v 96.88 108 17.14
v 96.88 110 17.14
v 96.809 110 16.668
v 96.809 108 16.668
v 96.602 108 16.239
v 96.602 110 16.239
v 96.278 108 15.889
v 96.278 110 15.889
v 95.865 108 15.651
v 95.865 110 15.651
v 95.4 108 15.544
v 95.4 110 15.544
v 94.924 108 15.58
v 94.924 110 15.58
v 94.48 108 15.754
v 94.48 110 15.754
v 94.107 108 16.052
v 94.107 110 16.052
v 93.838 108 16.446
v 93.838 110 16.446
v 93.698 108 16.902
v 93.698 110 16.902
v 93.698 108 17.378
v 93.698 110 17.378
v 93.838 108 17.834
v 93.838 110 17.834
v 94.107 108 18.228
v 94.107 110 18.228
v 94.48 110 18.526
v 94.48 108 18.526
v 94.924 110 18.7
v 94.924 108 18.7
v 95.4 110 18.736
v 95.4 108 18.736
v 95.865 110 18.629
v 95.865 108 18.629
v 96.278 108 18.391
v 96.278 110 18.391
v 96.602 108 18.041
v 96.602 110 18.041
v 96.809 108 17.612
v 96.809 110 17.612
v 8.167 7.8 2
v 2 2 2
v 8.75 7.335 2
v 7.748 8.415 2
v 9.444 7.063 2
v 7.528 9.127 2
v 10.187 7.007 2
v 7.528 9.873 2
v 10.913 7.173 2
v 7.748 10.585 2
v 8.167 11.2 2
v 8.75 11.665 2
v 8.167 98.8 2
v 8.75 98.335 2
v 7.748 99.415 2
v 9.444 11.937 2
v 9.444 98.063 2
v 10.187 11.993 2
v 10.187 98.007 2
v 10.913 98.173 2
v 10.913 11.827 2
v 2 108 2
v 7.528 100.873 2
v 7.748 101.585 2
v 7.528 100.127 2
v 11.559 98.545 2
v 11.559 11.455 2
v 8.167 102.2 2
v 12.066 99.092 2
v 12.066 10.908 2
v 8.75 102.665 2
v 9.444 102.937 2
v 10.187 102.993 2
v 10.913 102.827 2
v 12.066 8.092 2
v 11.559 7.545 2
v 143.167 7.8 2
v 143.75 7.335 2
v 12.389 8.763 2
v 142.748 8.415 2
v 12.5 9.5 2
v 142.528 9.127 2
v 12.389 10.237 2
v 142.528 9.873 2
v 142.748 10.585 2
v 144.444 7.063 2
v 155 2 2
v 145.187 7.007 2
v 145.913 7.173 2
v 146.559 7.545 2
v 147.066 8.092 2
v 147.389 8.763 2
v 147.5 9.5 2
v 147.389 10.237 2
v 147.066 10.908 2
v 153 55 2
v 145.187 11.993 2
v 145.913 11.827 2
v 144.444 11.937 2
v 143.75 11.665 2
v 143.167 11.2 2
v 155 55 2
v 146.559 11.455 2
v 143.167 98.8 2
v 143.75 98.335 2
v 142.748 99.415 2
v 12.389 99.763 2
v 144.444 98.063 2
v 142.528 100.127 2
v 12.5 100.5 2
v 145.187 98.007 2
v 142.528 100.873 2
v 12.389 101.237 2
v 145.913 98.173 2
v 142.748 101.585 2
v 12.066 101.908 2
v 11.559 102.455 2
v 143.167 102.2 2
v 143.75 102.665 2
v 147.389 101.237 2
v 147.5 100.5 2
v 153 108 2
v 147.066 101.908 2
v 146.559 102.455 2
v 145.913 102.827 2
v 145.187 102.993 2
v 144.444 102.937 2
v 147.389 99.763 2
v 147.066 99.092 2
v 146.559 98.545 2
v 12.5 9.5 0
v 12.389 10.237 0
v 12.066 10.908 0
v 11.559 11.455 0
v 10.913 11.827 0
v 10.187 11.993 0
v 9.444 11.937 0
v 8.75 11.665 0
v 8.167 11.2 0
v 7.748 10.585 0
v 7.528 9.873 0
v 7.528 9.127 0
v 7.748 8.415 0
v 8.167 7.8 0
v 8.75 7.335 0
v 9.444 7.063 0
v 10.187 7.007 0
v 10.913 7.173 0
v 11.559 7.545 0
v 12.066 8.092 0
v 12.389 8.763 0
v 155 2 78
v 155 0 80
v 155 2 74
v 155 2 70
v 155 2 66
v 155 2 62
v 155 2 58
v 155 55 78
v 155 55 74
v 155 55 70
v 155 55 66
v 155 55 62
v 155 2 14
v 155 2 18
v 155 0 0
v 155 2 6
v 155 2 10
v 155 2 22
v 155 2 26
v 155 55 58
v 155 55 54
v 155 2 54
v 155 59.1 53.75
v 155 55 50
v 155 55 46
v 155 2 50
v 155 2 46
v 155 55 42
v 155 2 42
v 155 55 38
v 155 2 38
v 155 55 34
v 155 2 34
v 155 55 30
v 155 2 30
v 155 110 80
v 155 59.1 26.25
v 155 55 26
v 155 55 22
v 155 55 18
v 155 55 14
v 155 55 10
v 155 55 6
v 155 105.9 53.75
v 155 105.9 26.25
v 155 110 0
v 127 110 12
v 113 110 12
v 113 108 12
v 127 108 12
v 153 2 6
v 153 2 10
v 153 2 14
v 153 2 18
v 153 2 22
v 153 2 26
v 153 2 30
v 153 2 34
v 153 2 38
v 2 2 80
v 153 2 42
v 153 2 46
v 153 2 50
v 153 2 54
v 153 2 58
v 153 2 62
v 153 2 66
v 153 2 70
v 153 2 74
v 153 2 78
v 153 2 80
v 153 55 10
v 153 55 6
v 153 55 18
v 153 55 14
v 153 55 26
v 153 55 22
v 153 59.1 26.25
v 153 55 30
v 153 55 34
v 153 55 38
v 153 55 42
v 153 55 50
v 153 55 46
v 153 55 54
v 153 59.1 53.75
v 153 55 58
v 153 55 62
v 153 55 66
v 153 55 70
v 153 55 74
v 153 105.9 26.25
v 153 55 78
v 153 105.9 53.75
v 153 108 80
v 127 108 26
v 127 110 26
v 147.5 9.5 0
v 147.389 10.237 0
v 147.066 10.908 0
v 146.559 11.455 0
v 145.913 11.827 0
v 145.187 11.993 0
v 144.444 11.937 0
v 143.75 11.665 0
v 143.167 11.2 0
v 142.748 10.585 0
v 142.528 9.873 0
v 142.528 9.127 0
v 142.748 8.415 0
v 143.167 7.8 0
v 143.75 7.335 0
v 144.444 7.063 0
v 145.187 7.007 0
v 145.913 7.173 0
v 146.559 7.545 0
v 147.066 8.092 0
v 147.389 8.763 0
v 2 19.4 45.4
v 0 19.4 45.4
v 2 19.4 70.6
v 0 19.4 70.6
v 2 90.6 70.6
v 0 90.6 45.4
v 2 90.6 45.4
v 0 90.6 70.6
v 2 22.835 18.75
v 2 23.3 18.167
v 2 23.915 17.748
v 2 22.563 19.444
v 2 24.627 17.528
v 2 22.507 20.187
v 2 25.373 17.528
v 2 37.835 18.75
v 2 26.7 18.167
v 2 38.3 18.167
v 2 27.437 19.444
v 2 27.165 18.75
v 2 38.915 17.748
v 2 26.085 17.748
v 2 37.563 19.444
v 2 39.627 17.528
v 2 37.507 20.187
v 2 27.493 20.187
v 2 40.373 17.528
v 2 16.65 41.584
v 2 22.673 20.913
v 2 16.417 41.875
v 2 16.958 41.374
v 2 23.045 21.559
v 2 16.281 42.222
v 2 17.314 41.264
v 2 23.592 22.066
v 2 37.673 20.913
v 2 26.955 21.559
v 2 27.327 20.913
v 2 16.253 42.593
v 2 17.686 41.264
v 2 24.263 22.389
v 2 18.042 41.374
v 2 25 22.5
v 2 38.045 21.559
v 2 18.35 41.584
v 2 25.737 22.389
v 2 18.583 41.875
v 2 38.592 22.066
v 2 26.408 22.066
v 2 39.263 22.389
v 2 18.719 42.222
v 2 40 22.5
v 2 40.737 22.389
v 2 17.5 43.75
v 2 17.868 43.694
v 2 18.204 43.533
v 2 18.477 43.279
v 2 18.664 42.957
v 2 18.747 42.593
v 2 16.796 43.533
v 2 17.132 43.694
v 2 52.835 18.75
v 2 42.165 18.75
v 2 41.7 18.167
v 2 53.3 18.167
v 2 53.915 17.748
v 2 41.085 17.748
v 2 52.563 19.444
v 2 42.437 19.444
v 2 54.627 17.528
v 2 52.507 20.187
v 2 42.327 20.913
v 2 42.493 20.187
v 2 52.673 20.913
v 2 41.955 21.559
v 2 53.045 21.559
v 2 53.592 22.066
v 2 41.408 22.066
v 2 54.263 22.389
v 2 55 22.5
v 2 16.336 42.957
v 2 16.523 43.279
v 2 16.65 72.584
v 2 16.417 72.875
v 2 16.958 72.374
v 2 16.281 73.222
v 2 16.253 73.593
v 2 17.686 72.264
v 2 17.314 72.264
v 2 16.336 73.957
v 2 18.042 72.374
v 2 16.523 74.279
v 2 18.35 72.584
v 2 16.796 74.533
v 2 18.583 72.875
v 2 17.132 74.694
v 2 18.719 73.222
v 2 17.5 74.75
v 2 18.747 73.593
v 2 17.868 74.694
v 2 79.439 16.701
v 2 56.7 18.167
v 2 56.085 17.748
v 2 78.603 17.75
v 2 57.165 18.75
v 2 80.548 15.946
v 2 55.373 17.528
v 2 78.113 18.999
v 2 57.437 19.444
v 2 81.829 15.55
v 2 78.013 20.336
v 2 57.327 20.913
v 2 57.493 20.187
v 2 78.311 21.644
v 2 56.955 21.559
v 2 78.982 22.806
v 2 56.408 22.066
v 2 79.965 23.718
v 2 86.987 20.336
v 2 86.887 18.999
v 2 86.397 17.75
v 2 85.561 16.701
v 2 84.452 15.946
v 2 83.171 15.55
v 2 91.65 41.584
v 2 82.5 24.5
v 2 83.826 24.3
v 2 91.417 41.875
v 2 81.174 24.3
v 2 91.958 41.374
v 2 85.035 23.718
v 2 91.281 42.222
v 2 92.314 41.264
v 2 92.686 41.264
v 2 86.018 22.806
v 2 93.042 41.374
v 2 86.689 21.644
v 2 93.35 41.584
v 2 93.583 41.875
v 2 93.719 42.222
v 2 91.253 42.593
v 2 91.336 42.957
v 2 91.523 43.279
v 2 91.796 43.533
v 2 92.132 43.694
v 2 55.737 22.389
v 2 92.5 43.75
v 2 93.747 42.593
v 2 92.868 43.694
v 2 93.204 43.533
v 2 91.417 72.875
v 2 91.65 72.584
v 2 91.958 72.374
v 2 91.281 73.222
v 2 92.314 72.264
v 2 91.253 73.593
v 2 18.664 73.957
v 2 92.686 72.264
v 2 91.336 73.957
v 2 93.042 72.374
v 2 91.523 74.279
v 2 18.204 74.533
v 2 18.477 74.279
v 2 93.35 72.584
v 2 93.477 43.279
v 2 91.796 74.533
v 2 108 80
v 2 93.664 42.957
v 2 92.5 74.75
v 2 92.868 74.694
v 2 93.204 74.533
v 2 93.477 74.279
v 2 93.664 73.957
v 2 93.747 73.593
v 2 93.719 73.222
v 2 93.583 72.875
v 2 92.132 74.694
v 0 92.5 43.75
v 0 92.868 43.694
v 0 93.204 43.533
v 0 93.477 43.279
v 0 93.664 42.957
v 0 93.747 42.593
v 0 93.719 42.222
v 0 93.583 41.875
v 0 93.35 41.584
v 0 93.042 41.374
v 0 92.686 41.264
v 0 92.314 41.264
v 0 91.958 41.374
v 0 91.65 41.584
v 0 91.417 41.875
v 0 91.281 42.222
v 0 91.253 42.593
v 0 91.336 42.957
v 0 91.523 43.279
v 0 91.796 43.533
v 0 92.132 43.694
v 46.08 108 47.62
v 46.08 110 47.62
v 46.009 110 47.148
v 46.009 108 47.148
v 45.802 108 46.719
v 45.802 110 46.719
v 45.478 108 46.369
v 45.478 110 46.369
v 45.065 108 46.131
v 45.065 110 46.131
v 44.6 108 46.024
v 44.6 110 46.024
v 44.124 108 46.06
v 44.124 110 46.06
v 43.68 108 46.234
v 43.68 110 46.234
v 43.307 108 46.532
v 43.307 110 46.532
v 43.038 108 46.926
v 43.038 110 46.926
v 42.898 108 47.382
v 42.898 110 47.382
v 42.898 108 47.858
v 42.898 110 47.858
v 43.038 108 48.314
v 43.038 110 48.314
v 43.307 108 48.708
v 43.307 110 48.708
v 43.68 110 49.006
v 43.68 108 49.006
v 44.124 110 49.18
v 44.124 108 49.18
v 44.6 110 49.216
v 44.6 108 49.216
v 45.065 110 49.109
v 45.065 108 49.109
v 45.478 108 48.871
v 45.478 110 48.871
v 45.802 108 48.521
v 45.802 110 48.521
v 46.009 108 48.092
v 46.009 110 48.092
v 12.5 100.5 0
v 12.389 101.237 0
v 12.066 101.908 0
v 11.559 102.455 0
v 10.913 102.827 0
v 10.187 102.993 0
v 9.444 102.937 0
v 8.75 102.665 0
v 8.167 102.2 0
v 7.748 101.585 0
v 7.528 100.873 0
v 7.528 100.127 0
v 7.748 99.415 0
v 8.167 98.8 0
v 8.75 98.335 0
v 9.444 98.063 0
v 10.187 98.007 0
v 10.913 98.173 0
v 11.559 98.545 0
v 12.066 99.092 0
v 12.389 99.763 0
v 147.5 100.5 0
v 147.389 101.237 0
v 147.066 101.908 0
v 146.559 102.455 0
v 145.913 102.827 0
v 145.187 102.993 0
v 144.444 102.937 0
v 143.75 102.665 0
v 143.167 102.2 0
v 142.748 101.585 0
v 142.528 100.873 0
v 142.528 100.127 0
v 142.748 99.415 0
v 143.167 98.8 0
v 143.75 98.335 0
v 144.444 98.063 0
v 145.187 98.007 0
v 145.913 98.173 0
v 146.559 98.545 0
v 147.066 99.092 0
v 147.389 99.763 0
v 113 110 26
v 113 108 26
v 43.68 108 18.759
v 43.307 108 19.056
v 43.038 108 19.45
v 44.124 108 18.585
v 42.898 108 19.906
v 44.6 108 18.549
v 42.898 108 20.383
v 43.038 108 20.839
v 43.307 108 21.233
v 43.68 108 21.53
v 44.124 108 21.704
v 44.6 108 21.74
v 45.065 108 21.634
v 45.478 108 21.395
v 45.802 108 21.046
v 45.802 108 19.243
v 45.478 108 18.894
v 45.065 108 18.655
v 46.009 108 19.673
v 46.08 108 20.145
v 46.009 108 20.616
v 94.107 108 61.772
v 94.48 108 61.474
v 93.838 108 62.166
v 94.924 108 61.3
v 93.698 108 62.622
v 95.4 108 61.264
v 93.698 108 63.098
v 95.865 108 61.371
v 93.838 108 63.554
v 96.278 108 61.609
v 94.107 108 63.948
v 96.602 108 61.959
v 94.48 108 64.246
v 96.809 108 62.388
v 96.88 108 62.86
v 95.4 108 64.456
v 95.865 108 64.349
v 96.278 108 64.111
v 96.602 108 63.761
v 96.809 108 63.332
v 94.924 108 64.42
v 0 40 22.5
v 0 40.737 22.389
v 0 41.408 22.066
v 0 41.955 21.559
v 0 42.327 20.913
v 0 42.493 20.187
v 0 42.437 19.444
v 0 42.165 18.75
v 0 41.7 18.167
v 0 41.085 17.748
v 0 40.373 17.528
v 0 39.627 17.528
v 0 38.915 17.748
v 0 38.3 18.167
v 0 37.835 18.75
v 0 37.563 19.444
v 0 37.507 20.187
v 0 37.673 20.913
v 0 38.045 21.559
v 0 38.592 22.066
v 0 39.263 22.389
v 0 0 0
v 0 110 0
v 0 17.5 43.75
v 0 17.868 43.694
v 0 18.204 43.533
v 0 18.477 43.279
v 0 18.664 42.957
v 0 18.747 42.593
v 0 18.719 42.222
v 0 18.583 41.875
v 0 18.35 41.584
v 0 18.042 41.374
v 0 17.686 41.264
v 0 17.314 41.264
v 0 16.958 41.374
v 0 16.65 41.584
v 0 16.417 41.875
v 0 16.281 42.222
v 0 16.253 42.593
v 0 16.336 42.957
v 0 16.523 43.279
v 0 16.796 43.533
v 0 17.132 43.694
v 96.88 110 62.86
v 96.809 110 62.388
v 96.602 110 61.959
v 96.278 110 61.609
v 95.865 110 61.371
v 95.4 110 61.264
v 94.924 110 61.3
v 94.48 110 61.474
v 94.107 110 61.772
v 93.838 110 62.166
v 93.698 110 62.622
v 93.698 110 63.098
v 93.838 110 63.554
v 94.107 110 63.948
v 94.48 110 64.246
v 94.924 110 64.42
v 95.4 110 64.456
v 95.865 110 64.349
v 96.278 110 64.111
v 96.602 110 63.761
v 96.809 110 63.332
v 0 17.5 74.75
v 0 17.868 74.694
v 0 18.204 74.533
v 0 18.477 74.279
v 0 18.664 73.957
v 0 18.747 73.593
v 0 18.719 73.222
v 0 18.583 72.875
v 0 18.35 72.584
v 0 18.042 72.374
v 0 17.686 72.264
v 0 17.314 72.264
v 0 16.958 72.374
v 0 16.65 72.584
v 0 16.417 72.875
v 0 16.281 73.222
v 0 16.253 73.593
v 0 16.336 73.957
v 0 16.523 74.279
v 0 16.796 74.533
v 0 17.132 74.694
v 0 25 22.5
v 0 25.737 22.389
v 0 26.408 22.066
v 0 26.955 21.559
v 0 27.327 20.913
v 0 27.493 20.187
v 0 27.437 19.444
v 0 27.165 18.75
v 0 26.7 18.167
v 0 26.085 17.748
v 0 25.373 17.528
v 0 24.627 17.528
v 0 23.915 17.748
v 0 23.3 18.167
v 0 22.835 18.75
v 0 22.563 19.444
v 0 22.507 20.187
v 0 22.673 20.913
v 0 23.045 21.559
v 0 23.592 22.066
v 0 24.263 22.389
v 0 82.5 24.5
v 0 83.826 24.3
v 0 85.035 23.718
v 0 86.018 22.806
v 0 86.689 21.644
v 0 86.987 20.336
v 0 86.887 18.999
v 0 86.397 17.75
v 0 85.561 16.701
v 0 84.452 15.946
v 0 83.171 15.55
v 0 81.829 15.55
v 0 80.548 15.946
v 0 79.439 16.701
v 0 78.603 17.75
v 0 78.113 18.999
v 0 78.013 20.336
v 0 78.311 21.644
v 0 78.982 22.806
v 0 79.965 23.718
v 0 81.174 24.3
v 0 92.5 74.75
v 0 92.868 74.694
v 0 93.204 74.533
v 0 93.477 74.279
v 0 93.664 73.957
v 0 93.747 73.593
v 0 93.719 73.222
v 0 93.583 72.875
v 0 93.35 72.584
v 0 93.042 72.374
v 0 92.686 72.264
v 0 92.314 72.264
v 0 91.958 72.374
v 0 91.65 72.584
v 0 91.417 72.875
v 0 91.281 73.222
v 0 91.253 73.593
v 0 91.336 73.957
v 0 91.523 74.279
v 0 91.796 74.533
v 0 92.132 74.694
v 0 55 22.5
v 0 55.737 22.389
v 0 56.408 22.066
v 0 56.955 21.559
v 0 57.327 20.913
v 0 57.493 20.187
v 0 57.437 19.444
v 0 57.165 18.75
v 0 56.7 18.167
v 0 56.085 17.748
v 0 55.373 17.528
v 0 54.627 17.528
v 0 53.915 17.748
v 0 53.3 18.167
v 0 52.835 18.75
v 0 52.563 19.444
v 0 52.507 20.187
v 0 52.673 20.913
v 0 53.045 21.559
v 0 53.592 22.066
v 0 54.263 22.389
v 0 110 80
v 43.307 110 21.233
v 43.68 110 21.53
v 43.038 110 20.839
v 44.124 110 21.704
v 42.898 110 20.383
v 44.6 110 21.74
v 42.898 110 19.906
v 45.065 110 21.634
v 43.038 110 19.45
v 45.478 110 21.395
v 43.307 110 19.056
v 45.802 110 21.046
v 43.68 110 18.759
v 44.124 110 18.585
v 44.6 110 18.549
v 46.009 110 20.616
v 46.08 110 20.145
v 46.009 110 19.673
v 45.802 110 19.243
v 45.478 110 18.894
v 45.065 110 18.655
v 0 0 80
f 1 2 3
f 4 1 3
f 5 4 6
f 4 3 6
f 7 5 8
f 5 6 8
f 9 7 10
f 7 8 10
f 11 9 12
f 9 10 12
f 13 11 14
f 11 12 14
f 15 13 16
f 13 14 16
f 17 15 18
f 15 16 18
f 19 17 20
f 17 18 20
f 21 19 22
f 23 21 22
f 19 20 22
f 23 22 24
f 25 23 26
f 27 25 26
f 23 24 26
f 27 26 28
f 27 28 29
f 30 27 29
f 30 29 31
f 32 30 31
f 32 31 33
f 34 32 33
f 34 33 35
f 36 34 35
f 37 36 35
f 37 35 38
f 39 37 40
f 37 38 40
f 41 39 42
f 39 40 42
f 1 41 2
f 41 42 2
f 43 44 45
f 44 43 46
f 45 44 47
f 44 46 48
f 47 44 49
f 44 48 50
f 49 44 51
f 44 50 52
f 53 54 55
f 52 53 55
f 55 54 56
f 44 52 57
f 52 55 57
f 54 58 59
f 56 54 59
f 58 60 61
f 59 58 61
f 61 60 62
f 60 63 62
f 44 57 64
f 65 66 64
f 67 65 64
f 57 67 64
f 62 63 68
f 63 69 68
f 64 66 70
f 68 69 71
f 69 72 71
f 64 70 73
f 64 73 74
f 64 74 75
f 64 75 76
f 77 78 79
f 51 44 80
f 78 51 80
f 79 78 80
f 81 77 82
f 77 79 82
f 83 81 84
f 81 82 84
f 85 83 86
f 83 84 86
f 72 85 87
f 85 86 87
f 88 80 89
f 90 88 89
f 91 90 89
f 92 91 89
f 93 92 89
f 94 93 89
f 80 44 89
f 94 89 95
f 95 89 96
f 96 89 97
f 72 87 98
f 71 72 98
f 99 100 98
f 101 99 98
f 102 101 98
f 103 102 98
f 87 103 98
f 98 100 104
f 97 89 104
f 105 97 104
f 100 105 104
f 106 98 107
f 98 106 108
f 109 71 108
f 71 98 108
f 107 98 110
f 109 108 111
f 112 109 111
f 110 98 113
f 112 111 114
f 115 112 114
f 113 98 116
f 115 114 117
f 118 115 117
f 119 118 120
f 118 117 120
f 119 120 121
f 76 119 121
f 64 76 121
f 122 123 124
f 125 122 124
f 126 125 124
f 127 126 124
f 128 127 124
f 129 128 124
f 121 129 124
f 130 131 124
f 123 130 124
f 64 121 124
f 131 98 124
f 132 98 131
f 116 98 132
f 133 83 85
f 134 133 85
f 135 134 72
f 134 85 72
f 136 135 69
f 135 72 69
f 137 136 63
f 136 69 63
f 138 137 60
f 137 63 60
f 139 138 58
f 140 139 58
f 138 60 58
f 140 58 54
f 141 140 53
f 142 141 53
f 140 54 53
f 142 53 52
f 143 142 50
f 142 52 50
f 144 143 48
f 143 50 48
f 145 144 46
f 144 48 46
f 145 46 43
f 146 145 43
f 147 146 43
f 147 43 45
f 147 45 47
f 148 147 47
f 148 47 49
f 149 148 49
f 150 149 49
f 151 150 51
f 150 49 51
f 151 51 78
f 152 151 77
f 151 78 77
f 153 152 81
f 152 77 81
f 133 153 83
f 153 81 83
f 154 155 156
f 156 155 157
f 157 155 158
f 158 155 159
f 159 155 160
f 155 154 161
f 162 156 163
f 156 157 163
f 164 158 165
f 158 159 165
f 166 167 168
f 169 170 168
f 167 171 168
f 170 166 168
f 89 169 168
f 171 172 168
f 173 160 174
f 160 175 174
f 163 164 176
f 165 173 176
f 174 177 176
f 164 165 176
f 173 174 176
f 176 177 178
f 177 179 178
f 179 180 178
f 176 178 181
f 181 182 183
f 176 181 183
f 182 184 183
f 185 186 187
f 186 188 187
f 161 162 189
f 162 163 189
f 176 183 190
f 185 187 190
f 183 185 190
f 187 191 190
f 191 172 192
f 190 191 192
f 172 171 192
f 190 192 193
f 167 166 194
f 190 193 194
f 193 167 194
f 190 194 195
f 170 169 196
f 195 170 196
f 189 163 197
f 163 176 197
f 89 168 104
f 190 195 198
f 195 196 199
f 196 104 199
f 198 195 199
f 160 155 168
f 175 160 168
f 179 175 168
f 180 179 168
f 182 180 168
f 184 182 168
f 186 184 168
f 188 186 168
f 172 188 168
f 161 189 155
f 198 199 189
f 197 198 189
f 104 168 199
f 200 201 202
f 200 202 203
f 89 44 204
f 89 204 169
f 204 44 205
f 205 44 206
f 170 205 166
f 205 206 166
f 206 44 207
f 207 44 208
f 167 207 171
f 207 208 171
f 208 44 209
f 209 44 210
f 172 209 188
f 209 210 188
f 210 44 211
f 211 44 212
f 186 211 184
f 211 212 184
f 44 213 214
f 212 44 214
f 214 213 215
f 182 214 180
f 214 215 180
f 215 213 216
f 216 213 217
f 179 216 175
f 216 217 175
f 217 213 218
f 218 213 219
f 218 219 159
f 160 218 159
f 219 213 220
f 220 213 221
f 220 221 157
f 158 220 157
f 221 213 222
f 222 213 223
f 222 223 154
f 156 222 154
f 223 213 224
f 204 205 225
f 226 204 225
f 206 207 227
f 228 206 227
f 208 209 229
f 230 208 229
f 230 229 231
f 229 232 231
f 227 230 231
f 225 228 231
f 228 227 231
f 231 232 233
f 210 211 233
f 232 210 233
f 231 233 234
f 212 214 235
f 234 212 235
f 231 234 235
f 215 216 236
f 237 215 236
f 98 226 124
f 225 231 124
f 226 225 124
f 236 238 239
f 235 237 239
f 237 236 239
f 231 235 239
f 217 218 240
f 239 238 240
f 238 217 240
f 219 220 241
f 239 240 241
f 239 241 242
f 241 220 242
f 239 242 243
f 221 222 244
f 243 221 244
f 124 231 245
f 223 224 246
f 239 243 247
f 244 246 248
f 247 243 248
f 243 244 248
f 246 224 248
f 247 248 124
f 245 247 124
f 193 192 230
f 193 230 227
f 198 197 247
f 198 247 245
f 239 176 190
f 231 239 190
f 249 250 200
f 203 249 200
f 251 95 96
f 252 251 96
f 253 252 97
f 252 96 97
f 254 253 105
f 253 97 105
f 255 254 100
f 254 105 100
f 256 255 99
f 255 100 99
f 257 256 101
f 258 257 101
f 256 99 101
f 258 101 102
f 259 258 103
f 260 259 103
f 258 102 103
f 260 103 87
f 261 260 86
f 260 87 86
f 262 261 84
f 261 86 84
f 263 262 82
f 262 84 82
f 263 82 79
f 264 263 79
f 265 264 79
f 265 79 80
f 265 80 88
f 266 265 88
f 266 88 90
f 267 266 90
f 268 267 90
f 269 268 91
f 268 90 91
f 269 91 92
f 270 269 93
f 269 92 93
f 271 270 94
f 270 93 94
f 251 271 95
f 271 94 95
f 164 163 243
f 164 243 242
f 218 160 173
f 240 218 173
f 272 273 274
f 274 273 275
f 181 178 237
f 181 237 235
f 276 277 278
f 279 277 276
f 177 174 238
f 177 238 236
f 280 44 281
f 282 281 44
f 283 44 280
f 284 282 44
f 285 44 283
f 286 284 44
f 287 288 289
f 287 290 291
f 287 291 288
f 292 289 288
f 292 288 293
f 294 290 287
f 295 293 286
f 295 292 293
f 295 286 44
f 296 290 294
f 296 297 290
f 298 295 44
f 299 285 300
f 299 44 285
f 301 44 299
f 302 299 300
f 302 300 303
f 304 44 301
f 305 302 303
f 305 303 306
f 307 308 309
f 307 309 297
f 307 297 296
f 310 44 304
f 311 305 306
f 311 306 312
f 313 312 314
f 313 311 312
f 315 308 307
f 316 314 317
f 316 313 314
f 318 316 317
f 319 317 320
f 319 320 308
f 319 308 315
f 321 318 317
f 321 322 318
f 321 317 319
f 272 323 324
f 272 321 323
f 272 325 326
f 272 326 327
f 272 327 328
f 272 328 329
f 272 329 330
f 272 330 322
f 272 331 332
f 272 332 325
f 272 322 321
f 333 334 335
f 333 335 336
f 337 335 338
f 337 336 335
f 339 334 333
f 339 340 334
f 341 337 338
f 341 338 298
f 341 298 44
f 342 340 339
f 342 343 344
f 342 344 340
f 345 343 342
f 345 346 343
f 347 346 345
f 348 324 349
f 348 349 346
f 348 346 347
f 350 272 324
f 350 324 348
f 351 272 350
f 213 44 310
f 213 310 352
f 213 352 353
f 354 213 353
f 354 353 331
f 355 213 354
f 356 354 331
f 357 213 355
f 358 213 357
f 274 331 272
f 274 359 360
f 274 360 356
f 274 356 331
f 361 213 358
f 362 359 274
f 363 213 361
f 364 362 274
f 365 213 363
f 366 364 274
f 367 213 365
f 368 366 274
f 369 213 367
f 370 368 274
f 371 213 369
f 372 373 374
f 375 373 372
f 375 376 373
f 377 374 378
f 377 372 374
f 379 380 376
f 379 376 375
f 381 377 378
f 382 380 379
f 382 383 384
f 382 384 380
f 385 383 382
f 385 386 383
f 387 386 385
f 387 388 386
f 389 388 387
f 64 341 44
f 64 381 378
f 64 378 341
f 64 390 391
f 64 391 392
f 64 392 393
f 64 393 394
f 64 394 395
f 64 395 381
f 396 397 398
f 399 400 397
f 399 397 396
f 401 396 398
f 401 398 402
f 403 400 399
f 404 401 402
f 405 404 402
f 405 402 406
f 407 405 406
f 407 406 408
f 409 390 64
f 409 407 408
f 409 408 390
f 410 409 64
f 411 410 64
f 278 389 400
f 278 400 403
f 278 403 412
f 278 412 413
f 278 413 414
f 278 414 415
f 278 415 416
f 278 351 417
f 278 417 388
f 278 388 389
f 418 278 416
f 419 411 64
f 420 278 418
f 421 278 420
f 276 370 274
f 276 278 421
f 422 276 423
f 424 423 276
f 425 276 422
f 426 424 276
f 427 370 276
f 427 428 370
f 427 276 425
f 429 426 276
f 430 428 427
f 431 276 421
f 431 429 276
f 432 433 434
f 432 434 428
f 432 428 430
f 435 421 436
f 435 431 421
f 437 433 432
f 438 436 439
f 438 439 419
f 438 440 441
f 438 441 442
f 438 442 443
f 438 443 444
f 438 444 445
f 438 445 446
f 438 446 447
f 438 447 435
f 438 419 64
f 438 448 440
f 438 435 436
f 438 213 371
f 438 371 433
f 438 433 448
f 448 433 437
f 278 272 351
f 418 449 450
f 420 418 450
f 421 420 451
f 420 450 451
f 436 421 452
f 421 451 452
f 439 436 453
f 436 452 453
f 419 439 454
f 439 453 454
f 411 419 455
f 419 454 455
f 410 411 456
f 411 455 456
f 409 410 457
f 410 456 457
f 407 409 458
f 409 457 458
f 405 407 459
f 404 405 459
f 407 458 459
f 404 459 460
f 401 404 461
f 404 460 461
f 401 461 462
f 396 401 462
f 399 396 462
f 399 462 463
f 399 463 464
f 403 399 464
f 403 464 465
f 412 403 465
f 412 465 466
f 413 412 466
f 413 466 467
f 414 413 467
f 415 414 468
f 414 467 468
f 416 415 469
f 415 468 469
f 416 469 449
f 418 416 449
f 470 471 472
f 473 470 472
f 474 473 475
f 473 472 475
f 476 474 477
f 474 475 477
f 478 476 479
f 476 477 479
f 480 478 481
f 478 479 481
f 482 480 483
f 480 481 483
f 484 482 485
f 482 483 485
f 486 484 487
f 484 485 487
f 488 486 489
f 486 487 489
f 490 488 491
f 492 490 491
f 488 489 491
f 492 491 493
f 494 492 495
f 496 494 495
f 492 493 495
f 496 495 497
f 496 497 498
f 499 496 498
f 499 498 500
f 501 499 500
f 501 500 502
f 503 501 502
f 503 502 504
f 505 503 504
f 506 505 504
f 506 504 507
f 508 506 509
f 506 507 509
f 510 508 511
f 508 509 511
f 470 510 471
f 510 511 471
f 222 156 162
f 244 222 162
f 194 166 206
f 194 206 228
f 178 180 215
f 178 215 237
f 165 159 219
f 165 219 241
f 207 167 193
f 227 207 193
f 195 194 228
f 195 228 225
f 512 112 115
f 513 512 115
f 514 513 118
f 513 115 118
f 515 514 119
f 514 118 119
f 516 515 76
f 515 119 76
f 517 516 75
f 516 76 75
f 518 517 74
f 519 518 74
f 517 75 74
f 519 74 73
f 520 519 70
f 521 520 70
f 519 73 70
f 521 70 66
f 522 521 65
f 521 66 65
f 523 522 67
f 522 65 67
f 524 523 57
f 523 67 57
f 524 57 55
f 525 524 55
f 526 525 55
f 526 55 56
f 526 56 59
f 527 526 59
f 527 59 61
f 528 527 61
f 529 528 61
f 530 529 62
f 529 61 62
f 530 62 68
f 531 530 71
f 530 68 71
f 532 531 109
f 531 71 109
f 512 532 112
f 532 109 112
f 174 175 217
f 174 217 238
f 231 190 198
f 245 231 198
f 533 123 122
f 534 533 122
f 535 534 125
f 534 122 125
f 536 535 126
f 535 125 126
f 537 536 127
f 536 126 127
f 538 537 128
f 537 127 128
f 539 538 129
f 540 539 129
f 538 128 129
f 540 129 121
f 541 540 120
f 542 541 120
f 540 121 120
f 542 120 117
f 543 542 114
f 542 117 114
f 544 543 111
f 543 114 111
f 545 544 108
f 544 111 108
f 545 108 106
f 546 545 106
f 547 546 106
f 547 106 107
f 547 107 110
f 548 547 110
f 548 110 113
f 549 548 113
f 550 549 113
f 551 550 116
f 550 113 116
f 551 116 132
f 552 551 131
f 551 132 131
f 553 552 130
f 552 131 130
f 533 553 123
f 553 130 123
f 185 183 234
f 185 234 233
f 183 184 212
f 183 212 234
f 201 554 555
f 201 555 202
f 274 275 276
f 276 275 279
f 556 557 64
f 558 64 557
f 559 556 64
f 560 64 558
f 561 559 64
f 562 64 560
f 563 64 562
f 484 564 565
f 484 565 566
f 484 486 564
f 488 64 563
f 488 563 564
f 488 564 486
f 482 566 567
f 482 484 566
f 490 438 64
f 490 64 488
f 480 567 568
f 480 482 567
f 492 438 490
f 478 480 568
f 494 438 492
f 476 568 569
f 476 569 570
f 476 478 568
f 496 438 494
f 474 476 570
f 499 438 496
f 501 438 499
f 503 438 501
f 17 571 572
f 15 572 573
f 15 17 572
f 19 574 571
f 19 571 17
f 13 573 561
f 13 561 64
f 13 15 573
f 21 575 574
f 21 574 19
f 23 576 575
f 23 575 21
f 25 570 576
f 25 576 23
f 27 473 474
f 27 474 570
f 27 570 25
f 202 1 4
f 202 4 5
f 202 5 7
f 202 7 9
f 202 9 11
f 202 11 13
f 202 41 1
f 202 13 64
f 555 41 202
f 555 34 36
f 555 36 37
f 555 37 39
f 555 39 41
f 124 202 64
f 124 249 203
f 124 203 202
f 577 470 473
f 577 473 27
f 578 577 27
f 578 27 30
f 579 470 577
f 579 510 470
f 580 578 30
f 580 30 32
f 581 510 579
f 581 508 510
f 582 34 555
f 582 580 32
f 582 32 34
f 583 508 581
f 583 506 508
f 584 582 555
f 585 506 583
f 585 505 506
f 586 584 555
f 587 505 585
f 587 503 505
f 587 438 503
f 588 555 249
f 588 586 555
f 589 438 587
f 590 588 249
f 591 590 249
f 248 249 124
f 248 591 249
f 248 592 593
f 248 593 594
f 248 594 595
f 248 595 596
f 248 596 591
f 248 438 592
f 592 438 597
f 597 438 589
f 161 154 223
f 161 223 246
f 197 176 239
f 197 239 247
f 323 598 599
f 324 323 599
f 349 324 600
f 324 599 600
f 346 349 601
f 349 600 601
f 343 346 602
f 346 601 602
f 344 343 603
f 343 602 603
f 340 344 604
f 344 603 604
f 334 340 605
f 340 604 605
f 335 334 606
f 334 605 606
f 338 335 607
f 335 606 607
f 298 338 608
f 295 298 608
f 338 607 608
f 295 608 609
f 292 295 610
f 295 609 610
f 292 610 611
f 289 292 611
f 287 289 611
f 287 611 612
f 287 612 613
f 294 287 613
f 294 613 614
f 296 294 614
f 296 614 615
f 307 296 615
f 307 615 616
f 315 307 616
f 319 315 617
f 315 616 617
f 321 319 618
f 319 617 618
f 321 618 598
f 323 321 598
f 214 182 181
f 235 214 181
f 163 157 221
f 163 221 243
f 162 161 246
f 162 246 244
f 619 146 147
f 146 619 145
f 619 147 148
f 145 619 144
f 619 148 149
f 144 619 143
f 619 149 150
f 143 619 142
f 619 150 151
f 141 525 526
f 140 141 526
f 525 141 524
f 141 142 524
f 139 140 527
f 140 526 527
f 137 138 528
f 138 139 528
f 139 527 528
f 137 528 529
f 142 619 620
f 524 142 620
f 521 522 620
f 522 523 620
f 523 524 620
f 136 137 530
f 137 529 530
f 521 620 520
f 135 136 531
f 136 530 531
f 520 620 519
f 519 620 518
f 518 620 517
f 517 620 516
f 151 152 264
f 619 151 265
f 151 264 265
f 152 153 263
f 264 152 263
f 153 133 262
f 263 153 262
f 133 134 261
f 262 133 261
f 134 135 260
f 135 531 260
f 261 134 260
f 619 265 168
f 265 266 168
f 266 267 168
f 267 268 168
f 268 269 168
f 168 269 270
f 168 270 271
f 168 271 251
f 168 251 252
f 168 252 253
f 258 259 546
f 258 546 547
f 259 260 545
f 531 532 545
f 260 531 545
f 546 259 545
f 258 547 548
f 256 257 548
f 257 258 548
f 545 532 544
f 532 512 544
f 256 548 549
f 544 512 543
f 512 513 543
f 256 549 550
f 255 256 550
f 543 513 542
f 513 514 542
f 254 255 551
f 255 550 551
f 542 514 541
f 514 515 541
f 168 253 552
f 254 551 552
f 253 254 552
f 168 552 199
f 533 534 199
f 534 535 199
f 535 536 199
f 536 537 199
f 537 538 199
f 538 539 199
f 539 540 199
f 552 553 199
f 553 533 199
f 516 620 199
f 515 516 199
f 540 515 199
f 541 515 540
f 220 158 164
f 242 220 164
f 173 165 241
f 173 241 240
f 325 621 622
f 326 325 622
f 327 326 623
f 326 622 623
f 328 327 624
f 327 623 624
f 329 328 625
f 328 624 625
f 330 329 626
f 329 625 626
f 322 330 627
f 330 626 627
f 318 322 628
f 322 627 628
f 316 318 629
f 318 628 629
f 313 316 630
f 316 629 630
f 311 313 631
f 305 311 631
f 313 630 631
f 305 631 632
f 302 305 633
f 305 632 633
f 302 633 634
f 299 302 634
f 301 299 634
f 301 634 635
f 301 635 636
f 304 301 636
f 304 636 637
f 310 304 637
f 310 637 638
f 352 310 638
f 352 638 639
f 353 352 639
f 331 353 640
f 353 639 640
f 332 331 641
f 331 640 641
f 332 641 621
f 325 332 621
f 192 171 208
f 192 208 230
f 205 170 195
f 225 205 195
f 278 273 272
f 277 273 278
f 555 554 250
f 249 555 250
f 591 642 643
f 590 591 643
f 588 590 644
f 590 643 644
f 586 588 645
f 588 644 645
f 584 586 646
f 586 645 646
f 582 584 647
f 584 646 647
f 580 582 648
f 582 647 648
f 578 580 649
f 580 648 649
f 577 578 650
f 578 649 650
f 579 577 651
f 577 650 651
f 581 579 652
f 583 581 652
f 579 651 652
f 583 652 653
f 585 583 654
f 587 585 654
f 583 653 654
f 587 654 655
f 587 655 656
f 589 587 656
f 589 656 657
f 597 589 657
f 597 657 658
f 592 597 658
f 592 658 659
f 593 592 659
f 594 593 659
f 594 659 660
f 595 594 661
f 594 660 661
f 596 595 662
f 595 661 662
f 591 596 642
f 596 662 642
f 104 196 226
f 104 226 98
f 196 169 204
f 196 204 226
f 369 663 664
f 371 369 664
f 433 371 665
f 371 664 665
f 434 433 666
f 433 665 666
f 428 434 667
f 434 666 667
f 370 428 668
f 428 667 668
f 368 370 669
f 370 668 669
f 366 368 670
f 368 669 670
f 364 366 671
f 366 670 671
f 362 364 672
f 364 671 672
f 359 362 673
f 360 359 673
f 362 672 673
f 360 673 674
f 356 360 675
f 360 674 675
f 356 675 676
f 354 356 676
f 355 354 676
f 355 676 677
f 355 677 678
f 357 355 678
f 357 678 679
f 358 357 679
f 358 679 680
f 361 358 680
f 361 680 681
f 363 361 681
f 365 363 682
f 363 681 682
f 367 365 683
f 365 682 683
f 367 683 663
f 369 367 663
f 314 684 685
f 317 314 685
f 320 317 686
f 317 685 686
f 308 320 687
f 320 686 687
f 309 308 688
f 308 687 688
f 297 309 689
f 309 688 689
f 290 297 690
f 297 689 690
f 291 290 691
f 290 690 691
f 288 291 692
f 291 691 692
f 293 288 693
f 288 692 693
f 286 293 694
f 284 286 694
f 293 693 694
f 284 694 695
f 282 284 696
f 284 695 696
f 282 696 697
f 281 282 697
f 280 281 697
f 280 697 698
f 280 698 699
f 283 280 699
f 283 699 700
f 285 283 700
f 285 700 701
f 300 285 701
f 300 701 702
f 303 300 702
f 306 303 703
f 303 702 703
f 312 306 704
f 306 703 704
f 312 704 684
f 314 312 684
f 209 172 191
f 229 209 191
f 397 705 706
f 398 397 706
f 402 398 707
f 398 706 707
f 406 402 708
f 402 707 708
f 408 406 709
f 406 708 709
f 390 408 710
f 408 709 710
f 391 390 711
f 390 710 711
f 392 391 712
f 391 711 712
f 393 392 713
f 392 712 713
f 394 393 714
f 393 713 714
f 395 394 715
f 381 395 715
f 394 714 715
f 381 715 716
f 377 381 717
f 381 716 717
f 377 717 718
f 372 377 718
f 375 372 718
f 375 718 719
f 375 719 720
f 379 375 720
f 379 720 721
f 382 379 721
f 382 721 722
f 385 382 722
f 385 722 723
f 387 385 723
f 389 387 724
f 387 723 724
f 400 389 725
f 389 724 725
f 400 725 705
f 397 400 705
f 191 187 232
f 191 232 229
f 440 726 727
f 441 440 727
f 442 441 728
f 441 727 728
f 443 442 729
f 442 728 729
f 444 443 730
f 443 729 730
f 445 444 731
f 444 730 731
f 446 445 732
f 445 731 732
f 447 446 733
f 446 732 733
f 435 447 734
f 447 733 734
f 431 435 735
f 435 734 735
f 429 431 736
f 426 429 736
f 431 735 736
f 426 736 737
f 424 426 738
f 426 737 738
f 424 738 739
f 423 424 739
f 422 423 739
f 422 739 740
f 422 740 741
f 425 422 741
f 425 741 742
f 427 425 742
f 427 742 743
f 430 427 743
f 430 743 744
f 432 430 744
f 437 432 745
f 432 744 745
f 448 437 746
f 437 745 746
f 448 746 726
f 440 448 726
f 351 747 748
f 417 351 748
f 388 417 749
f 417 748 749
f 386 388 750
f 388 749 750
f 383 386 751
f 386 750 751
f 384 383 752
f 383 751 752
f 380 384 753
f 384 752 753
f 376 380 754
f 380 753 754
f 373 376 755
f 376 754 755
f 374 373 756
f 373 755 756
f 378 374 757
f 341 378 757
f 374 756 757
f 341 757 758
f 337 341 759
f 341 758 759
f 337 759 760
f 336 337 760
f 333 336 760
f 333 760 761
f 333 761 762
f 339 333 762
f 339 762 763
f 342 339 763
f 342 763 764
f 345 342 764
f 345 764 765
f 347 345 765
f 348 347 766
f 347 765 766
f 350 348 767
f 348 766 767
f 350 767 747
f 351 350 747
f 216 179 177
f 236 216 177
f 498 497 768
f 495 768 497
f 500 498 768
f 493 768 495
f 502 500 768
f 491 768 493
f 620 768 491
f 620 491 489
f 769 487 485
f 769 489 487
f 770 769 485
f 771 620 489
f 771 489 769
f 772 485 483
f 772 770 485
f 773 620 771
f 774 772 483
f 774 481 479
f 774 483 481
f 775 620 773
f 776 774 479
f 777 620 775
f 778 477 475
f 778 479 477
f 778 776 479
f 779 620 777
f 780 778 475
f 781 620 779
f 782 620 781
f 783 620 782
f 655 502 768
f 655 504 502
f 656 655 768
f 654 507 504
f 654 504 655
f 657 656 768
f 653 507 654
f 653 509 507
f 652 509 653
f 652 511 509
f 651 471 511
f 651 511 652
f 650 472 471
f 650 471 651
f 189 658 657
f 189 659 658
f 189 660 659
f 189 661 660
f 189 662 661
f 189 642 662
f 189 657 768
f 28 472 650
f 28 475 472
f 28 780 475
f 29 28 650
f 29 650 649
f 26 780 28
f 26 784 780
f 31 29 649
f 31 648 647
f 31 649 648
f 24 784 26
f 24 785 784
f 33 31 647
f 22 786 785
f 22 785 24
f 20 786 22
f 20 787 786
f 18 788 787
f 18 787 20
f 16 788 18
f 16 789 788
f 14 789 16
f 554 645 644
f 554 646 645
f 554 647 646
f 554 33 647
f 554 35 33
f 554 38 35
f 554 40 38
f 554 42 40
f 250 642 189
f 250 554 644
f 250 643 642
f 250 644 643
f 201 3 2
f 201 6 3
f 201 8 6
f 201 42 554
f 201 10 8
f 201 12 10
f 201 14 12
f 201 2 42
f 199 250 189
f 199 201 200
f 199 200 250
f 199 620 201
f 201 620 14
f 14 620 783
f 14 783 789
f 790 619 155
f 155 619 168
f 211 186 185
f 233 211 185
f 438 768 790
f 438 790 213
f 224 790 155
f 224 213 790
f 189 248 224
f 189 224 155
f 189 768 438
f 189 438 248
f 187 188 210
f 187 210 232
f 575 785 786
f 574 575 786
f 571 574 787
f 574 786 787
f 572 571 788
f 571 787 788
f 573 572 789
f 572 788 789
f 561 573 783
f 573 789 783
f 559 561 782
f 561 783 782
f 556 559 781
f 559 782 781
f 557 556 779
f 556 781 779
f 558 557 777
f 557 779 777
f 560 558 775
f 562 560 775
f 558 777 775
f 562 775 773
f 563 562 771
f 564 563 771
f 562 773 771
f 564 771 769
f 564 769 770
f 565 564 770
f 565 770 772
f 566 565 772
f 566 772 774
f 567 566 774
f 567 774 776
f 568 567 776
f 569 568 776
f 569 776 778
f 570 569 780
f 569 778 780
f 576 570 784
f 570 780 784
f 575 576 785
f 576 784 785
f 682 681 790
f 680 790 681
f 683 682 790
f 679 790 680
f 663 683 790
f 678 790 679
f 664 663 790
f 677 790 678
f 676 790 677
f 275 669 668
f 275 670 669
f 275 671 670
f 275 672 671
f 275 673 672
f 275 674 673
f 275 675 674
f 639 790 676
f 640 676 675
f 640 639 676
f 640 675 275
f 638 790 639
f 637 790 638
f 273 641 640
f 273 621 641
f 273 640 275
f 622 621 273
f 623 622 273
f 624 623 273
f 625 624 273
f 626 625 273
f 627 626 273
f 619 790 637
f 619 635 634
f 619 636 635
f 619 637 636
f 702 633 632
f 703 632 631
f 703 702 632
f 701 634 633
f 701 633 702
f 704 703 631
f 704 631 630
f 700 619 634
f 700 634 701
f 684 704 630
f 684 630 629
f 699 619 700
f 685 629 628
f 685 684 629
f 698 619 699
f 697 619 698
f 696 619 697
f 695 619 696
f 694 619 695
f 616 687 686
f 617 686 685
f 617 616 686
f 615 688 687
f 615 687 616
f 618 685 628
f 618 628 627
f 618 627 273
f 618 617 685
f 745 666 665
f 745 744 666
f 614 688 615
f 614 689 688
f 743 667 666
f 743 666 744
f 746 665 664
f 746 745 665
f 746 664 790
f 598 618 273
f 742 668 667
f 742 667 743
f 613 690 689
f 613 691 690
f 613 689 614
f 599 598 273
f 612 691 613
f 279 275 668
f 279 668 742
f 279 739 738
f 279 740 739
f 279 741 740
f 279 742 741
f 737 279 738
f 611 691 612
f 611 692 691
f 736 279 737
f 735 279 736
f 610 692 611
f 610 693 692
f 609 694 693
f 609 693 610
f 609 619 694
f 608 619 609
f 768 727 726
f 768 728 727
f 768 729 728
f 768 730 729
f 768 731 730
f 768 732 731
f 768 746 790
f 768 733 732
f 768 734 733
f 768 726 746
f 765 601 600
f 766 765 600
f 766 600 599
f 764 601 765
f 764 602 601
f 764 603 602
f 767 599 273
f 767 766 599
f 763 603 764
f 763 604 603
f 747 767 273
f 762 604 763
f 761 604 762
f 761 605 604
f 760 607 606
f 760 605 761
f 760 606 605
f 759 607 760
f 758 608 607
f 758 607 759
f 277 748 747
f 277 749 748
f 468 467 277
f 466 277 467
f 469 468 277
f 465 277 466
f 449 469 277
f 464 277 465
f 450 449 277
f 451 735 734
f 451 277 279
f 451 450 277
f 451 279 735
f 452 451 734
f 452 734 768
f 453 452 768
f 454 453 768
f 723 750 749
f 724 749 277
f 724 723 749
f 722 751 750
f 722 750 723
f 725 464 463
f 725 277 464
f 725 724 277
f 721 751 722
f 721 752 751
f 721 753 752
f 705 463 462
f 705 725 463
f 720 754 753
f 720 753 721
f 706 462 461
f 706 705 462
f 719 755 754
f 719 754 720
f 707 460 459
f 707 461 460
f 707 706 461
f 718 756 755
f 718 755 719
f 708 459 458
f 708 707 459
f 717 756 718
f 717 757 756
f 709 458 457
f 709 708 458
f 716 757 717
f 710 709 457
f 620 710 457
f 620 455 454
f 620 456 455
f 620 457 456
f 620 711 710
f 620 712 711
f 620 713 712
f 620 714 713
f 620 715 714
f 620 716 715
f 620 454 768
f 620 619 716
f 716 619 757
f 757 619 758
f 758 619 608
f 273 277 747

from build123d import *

# Parameters (mm, degrees)
SKETCH1_W           = 155
SKETCH1_H           = 110
BOSS_EXTRUDE1_DEPTH = 80
SKETCH2_W           = 151
SKETCH2_H           = 106
CUT_EXTRUDE1_DEPTH  = 78
SKETCH3_R           = 2.5
CUT_EXTRUDE2_DEPTH  = 2
SKETCH7_R           = 1.6
CUT_EXTRUDE7_DEPTH  = 2
SKETCH4_W           = 27.5
SKETCH4_H           = 46.8
CUT_EXTRUDE8_DEPTH  = 2
SKETCH8_W           = 4
SKETCH8_H           = 53
CUT_EXTRUDE9_DEPTH  = 2
SKETCH9_W           = 14
SKETCH9_H           = 14
CUT_EXTRUDE10_DEPTH = 2
SKETCH10_W          = 25.2
SKETCH10_H          = 71.2
SKETCH10_R          = 1.25
CUT_EXTRUDE12_DEPTH = 2
SKETCH11_R          = 2.5
SKETCH11_R_2        = 4.5
CUT_EXTRUDE13_DEPTH = 2


with BuildPart() as part:
    # Sketch1 → Boss-Extrude1 (new body)
    with BuildSketch(Plane.XY):
        with Locations((77.5, 55)):
            Rectangle(SKETCH1_W, SKETCH1_H)
    extrude(amount=BOSS_EXTRUDE1_DEPTH)

    # Sketch2 → Cut-Extrude1 (cut)
    with BuildSketch(Plane.XY.offset(80)):
        with Locations((77.5, 55)):
            Rectangle(SKETCH2_W, SKETCH2_H)
    extrude(amount=-CUT_EXTRUDE1_DEPTH, mode=Mode.SUBTRACT)

    # Sketch3 → Cut-Extrude2 (cut)
    with BuildSketch(Plane.XY.offset(2)):
        with Locations((145, 100.5)):
            Circle(SKETCH3_R)
        with Locations((145, 9.5)):
            Circle(SKETCH3_R)
        with Locations((10, 9.5)):
            Circle(SKETCH3_R)
        with Locations((10, 100.5)):
            Circle(SKETCH3_R)
    extrude(amount=-CUT_EXTRUDE2_DEPTH, mode=Mode.SUBTRACT)

    # Sketch7 → Cut-Extrude7 (cut)
    with BuildSketch(Plane(origin=(0, 110, 0), x_dir=(1, 0, 0), z_dir=(0, 1, 0))):
        with Locations((44.48, -20.14450396)):
            Circle(SKETCH7_R)
        with Locations((95.28, -17.14)):
            Circle(SKETCH7_R)
        with Locations((95.28, -62.86)):
            Circle(SKETCH7_R)
        with Locations((44.48, -47.62)):
            Circle(SKETCH7_R)
    extrude(amount=-CUT_EXTRUDE7_DEPTH, mode=Mode.SUBTRACT)

    # Sketch4 → Cut-Extrude8 (cut)
    with BuildSketch(Plane(origin=(155, 0, 0), x_dir=(0, 0, -1), z_dir=(1, 0, 0))):
        with Locations((-40, 82.5)):
            Rectangle(SKETCH4_W, SKETCH4_H)
    extrude(amount=-CUT_EXTRUDE8_DEPTH, mode=Mode.SUBTRACT)

    # Sketch8 → Cut-Extrude9 (cut)
    with BuildSketch(Plane(origin=(155, 0, 0), x_dir=(0, 0, -1), z_dir=(1, 0, 0))):
        with Locations((-68, 28.5)):
            Rectangle(SKETCH8_W, SKETCH8_H)
        with Locations((-76, 28.5)):
            Rectangle(SKETCH8_W, SKETCH8_H)
        with Locations((-60, 28.5)):
            Rectangle(SKETCH8_W, SKETCH8_H)
        with Locations((-52, 28.5)):
            Rectangle(SKETCH8_W, SKETCH8_H)
        with Locations((-44, 28.5)):
            Rectangle(SKETCH8_W, SKETCH8_H)
        with Locations((-36, 28.5)):
            Rectangle(SKETCH8_W, SKETCH8_H)
        with Locations((-28, 28.5)):
            Rectangle(SKETCH8_W, SKETCH8_H)
        with Locations((-20, 28.5)):
            Rectangle(SKETCH8_W, SKETCH8_H)
        with Locations((-12, 28.5)):
            Rectangle(SKETCH8_W, SKETCH8_H)
        with Locations((-4, 28.5)):
            Rectangle(SKETCH8_W, SKETCH8_H)
    extrude(amount=-CUT_EXTRUDE9_DEPTH, mode=Mode.SUBTRACT)

    # Sketch9 → Cut-Extrude10 (cut)
    with BuildSketch(Plane(origin=(0, 110, 0), x_dir=(1, 0, 0), z_dir=(0, 1, 0))):
        with Locations((120, -19)):
            Rectangle(SKETCH9_W, SKETCH9_H)
    extrude(amount=-CUT_EXTRUDE10_DEPTH, mode=Mode.SUBTRACT)

    # Sketch10 → Cut-Extrude12 (cut)
    with BuildSketch(Plane.ZY):
        with Locations((58, 55)):
            Rectangle(SKETCH10_W, SKETCH10_H)
        with Locations((42.5, 92.5)):
            Circle(SKETCH10_R)
        with Locations((73.5, 92.5)):
            Circle(SKETCH10_R)
        with Locations((42.5, 17.5)):
            Circle(SKETCH10_R)
        with Locations((73.5, 17.5)):
            Circle(SKETCH10_R)
    extrude(amount=-CUT_EXTRUDE12_DEPTH, mode=Mode.SUBTRACT)

    # Sketch11 → Cut-Extrude13 (cut)
    with BuildSketch(Plane.ZY):
        with Locations((20, 55)):
            Circle(SKETCH11_R)
        with Locations((20, 40)):
            Circle(SKETCH11_R)
        with Locations((20, 25)):
            Circle(SKETCH11_R)
        with Locations((20, 82.5)):
            Circle(SKETCH11_R_2)
    extrude(amount=-CUT_EXTRUDE13_DEPTH, mode=Mode.SUBTRACT)


solid = part.part
